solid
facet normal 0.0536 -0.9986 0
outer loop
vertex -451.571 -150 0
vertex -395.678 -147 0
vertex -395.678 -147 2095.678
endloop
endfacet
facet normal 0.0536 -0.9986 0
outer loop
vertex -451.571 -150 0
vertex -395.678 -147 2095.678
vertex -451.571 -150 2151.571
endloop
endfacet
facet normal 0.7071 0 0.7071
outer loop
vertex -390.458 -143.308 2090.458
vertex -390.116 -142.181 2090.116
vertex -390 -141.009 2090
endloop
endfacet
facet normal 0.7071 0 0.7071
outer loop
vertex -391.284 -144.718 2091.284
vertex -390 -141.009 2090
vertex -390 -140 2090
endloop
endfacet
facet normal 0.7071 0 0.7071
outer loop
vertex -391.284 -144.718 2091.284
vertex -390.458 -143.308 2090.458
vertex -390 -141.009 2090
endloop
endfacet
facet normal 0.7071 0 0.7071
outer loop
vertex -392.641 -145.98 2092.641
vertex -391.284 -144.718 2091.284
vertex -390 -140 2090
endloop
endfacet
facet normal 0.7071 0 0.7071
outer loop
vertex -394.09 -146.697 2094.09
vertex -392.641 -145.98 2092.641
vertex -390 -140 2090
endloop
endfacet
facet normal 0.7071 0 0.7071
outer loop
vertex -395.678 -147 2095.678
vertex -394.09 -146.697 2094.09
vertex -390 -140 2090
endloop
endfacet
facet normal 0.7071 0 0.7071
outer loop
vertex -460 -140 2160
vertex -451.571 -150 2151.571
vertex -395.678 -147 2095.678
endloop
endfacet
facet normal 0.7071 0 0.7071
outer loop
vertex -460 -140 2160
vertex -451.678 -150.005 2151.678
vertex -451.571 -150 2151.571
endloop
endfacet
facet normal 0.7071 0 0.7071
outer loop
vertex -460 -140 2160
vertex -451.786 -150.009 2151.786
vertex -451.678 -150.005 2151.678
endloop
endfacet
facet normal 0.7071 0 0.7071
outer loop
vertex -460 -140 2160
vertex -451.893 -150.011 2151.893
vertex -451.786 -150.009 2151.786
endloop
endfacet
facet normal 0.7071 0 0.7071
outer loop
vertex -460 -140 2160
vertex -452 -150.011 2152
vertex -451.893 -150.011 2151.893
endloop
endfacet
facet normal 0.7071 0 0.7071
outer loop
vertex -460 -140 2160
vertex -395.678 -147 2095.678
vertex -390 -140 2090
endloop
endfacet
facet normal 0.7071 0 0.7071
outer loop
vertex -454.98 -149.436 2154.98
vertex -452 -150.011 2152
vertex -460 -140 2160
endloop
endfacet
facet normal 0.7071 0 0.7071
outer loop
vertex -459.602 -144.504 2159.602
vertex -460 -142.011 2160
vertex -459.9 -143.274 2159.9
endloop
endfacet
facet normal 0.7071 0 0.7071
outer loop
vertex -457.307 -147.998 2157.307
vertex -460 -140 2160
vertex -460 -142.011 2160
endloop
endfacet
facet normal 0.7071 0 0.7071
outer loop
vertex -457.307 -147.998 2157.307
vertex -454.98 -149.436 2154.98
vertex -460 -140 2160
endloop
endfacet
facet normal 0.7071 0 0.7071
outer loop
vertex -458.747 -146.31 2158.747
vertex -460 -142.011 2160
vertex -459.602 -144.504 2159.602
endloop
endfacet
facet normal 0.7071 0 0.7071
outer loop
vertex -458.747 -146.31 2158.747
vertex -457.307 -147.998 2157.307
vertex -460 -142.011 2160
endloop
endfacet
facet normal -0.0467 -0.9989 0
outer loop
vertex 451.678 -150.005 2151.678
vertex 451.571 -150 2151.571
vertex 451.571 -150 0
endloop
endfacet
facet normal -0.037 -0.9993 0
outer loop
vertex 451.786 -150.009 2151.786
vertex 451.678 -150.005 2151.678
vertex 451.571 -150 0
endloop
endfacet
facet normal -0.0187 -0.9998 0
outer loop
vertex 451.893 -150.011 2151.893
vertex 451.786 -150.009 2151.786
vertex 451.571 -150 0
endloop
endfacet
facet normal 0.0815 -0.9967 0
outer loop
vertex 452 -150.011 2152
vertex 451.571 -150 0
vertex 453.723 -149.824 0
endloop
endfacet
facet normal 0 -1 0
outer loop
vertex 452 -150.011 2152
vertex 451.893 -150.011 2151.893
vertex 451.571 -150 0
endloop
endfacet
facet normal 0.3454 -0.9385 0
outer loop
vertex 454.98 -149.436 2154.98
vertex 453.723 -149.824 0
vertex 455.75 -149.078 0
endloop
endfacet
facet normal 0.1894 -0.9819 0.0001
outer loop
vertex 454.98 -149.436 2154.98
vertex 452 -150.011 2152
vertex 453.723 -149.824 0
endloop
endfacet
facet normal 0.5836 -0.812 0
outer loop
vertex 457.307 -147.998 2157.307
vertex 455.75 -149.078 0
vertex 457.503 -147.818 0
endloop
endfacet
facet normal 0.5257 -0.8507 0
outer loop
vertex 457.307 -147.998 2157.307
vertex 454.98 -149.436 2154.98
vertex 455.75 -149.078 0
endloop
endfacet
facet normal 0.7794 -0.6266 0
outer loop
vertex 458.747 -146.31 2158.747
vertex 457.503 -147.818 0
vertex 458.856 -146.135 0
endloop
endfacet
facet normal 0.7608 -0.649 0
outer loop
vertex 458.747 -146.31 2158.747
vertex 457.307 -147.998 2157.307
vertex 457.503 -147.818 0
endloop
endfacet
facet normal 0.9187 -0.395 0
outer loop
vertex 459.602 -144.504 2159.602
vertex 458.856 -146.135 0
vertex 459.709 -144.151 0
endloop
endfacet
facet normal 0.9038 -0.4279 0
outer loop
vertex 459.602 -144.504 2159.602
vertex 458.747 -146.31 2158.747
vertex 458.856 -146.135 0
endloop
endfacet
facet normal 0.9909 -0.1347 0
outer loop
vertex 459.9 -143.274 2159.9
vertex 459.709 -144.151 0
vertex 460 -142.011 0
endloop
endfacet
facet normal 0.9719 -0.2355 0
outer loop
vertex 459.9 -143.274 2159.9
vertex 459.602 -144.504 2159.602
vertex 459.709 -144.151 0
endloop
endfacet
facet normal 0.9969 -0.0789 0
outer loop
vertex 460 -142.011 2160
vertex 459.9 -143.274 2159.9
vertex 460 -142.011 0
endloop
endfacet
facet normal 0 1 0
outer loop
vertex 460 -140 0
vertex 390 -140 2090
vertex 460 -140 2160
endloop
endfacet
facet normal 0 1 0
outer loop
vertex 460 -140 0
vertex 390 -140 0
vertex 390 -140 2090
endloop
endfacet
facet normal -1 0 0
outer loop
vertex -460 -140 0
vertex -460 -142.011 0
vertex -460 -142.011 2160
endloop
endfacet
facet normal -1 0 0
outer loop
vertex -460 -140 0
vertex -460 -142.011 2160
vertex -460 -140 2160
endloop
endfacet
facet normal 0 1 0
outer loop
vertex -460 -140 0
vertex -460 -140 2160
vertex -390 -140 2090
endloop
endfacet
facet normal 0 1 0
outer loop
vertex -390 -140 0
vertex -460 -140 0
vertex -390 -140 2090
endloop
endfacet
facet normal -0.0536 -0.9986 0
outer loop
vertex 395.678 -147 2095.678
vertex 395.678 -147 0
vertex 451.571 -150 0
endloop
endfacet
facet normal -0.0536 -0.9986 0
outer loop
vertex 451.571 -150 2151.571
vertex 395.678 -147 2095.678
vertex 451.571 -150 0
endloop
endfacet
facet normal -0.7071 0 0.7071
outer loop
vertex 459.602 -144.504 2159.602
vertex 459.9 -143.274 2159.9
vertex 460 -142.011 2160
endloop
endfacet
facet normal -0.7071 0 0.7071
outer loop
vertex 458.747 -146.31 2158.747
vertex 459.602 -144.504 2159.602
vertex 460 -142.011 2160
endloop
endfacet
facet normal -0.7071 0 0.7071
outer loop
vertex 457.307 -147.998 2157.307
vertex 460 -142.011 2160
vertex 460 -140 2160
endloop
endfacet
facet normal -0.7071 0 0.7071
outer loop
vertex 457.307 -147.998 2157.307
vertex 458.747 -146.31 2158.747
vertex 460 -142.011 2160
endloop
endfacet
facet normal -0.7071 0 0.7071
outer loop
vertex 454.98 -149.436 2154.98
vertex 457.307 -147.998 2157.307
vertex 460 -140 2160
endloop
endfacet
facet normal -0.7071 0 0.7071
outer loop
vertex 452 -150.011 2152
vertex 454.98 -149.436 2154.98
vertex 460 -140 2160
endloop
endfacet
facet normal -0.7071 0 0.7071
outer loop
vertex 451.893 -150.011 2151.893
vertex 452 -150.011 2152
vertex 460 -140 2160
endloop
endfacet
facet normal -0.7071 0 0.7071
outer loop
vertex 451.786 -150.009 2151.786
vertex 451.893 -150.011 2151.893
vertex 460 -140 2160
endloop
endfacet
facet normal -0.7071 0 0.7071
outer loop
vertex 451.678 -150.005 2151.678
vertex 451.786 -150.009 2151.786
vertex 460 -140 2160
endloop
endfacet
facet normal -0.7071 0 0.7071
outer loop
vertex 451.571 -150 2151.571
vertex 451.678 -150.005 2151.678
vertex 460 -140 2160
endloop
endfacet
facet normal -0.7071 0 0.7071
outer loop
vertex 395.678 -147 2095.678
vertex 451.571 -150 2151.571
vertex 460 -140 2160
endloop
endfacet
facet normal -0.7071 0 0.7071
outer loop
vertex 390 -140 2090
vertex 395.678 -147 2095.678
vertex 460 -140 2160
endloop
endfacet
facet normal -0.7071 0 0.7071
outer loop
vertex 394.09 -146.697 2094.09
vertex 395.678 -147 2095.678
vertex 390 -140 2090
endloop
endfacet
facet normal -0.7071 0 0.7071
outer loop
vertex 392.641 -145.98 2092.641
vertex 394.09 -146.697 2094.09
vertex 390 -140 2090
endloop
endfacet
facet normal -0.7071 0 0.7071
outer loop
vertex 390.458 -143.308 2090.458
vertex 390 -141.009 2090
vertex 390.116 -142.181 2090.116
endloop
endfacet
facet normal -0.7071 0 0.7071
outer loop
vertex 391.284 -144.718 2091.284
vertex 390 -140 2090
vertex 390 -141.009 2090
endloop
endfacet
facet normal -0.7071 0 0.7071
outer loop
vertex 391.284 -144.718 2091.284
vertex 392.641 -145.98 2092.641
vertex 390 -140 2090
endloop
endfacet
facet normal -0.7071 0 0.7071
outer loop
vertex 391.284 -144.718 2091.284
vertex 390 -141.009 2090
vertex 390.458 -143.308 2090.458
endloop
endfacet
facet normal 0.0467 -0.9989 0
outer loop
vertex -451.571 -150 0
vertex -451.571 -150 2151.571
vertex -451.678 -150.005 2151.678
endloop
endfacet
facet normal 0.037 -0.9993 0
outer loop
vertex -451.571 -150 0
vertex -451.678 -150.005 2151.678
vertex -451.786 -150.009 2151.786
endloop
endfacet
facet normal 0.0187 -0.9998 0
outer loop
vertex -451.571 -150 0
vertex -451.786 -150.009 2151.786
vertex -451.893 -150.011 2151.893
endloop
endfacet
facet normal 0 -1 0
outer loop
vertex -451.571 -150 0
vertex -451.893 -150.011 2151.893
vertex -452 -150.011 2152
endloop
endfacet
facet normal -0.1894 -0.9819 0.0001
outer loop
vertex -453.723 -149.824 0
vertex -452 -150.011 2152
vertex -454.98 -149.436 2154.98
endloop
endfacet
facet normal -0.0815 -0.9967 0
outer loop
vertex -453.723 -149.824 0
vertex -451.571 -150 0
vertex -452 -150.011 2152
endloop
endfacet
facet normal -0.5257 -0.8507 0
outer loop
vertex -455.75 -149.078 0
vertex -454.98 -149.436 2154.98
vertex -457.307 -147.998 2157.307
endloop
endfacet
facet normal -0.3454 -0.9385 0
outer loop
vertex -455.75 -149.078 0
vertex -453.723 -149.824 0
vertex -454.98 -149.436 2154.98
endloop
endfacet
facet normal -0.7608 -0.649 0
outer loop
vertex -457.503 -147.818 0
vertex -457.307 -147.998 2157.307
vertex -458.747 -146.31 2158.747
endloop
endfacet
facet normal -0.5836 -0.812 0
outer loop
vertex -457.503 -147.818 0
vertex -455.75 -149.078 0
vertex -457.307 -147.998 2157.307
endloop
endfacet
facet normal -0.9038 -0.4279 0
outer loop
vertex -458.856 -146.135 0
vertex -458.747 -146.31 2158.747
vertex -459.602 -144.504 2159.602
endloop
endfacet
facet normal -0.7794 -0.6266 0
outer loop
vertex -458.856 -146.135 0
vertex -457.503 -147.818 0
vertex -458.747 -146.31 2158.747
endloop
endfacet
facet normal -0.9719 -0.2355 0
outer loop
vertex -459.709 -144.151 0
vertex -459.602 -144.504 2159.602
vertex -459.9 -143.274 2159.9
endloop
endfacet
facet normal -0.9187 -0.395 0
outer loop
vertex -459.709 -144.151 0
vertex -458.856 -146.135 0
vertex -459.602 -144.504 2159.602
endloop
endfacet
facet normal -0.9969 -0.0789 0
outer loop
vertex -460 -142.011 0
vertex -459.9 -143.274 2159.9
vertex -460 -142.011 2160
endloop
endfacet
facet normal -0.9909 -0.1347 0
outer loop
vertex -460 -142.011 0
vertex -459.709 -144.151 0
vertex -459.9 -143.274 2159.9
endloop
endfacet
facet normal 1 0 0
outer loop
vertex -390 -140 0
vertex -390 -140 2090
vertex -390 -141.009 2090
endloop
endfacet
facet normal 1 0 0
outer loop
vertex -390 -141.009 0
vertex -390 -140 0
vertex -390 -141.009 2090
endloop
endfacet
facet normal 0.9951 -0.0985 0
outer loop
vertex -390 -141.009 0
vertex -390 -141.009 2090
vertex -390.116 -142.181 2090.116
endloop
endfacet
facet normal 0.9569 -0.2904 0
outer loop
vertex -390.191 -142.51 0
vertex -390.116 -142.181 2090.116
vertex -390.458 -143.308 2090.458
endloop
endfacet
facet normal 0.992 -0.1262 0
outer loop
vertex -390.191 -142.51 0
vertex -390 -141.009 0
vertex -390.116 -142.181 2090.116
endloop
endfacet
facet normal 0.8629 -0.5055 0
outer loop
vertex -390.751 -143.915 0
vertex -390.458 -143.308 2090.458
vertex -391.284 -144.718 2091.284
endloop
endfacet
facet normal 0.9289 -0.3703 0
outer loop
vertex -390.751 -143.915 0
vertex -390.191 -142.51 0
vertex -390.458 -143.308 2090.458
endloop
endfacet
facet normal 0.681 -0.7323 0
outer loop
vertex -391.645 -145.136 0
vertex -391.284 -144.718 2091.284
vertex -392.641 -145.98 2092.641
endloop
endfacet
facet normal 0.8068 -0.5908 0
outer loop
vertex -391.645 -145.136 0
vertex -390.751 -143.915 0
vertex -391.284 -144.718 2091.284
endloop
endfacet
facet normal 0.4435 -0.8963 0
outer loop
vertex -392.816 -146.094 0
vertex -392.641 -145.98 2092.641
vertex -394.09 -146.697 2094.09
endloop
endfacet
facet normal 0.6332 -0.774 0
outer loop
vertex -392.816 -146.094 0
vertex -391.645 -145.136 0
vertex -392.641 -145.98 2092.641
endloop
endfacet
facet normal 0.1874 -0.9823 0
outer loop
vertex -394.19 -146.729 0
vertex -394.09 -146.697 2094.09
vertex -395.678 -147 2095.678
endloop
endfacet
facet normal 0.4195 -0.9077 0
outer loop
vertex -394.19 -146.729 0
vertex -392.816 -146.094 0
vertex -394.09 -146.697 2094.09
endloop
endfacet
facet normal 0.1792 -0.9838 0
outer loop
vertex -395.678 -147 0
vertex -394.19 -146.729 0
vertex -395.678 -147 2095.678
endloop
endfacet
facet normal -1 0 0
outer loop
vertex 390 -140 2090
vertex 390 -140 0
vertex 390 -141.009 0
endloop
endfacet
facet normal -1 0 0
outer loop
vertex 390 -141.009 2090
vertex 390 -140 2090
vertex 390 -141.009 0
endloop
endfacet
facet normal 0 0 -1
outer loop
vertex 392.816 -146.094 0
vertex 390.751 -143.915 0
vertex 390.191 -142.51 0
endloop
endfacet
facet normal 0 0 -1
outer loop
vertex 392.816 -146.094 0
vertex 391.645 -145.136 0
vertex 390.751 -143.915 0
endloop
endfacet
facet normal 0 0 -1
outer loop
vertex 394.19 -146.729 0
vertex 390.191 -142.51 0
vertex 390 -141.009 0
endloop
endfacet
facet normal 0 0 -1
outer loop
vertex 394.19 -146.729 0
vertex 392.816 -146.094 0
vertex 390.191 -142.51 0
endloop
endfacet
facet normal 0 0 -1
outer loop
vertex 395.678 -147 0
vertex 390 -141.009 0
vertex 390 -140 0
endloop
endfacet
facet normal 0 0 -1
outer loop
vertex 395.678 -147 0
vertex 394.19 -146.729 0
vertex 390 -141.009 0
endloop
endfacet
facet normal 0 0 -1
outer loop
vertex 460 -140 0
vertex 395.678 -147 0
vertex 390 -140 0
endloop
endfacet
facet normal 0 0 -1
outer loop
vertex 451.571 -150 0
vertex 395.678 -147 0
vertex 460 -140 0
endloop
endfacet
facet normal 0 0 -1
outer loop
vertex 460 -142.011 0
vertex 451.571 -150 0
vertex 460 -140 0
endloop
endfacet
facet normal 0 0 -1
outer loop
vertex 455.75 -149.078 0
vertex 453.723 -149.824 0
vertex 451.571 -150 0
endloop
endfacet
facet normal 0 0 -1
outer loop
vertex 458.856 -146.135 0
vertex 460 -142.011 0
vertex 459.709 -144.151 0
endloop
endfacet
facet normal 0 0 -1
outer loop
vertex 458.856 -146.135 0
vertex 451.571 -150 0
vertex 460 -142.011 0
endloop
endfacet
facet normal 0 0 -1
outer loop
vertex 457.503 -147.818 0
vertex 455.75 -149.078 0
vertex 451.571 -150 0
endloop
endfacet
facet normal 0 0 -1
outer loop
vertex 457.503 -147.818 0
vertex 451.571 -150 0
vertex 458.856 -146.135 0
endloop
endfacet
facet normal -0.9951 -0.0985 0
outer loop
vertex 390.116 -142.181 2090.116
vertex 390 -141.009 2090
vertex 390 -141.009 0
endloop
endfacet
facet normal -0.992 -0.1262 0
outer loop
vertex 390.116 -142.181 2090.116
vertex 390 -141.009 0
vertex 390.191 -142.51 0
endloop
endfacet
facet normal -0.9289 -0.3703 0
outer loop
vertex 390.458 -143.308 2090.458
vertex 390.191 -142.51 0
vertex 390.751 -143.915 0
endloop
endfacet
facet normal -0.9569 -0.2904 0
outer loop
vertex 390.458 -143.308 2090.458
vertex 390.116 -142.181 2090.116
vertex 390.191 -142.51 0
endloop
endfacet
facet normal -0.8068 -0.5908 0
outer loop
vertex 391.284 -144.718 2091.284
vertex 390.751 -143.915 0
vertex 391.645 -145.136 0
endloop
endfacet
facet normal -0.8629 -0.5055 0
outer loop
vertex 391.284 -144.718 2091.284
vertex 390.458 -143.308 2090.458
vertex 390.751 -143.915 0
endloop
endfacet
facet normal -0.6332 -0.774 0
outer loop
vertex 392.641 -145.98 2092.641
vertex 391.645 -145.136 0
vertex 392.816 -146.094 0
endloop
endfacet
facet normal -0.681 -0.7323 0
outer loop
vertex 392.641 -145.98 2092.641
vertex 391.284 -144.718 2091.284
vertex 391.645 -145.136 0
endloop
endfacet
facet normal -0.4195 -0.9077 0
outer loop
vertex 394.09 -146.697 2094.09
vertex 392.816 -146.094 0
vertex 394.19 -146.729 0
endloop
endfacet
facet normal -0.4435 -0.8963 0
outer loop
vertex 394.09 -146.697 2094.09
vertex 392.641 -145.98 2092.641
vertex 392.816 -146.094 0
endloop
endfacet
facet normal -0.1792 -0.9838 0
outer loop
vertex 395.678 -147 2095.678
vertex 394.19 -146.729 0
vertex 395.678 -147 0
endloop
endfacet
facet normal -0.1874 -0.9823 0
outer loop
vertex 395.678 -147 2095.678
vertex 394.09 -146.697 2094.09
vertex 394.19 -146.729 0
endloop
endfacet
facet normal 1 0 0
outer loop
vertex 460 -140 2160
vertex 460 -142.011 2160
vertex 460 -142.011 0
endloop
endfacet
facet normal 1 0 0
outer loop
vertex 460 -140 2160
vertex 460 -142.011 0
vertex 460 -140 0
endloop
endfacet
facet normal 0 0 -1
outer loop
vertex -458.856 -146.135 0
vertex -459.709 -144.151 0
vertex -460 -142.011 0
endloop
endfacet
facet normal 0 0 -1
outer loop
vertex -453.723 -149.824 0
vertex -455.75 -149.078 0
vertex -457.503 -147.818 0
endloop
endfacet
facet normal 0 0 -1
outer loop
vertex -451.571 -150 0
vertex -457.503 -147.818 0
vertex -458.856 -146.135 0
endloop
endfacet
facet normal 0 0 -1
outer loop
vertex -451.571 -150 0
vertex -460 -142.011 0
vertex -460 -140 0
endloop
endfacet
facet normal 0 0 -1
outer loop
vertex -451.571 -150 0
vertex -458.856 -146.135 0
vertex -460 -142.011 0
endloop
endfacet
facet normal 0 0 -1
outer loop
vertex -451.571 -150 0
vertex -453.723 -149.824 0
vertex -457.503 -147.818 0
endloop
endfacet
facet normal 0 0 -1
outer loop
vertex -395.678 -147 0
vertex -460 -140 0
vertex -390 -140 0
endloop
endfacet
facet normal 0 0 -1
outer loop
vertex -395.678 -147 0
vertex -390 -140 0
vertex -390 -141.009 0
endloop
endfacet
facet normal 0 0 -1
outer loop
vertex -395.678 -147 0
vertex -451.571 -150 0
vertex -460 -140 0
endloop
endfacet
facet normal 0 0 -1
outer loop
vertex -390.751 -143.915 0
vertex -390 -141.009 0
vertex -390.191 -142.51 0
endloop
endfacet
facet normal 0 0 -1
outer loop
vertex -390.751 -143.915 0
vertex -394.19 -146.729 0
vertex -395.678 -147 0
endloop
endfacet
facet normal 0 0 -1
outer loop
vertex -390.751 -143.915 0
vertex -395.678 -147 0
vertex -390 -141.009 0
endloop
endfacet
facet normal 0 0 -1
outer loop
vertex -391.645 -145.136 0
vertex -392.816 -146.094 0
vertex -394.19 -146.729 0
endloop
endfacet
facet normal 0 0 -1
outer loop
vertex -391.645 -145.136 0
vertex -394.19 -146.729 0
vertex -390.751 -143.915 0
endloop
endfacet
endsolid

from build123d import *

# Parameters (mm, degrees)
EXTRUDE039434_DEPTH = 500
SKETCH224_W         = 1600
SKETCH224_H         = 400
EXTRUDE039435_DEPTH = 500


with BuildPart() as extrude039434_internal_superior:
    # Sketch223 (on Sketch) → Extrude039434 (new body, symmetric)
    with BuildSketch(Plane.XZ):
        Polygon((-600, 2300), (600, 2300), (200, 1900), (-200, 1900), align=None)
    extrude(amount=EXTRUDE039434_DEPTH, both=True)


with BuildPart() as extrude039435:
    # Sketch224 (on Sketch) → Extrude039435 (new body, symmetric)
    with BuildSketch(Plane.XZ.offset(140)):
        with Locations((0, -200)):
            Rectangle(SKETCH224_W, SKETCH224_H)
    extrude(amount=EXTRUDE039435_DEPTH, both=True)


with BuildPart() as external_trim_vertical:
    # Sweep011: sweep along a path in Sketch194
    with BuildLine(Plane.XZ.offset(140)) as sweep011_path:
        Line((-390, 2090), (-390, 0))
        Line((-390, 0), (390, 0))
        Line((390, 0), (390, 2090))
        Line((390, 2090), (-390, 2090))
    # Clone2D027 (on Sketch) → Sweep011 (sweep)
    with BuildSketch(Plane(origin=(0, -140, 0), x_dir=(0, 0, 1), z_dir=(1, 0, 0))):
        with BuildLine():
            Line((-61.571224, 10), (-5.678418, 7))
            ThreePointArc((-5.678418, 7), (-1.645147, 5.136003), (0, 1.008624))
            Line((0, 1.008624), (0, 0))
            Line((0, 0), (-70, 0))
            Line((-70, 0), (-70, 2.011499))
            ThreePointArc((-70, 2.011499), (-67.503171, 7.81797), (-61.571224, 10))
        make_face()
    sweep(path=sweep011_path.line, is_frenet=True, transition=Transition.RIGHT)

    # Cut075: cut Extrude039435
    add(extrude039435.part, mode=Mode.SUBTRACT)

    # Cut071: cut Extrude039434_Internal_superior_
    add(extrude039434_internal_superior.part, mode=Mode.SUBTRACT)


solid = external_trim_vertical.part
